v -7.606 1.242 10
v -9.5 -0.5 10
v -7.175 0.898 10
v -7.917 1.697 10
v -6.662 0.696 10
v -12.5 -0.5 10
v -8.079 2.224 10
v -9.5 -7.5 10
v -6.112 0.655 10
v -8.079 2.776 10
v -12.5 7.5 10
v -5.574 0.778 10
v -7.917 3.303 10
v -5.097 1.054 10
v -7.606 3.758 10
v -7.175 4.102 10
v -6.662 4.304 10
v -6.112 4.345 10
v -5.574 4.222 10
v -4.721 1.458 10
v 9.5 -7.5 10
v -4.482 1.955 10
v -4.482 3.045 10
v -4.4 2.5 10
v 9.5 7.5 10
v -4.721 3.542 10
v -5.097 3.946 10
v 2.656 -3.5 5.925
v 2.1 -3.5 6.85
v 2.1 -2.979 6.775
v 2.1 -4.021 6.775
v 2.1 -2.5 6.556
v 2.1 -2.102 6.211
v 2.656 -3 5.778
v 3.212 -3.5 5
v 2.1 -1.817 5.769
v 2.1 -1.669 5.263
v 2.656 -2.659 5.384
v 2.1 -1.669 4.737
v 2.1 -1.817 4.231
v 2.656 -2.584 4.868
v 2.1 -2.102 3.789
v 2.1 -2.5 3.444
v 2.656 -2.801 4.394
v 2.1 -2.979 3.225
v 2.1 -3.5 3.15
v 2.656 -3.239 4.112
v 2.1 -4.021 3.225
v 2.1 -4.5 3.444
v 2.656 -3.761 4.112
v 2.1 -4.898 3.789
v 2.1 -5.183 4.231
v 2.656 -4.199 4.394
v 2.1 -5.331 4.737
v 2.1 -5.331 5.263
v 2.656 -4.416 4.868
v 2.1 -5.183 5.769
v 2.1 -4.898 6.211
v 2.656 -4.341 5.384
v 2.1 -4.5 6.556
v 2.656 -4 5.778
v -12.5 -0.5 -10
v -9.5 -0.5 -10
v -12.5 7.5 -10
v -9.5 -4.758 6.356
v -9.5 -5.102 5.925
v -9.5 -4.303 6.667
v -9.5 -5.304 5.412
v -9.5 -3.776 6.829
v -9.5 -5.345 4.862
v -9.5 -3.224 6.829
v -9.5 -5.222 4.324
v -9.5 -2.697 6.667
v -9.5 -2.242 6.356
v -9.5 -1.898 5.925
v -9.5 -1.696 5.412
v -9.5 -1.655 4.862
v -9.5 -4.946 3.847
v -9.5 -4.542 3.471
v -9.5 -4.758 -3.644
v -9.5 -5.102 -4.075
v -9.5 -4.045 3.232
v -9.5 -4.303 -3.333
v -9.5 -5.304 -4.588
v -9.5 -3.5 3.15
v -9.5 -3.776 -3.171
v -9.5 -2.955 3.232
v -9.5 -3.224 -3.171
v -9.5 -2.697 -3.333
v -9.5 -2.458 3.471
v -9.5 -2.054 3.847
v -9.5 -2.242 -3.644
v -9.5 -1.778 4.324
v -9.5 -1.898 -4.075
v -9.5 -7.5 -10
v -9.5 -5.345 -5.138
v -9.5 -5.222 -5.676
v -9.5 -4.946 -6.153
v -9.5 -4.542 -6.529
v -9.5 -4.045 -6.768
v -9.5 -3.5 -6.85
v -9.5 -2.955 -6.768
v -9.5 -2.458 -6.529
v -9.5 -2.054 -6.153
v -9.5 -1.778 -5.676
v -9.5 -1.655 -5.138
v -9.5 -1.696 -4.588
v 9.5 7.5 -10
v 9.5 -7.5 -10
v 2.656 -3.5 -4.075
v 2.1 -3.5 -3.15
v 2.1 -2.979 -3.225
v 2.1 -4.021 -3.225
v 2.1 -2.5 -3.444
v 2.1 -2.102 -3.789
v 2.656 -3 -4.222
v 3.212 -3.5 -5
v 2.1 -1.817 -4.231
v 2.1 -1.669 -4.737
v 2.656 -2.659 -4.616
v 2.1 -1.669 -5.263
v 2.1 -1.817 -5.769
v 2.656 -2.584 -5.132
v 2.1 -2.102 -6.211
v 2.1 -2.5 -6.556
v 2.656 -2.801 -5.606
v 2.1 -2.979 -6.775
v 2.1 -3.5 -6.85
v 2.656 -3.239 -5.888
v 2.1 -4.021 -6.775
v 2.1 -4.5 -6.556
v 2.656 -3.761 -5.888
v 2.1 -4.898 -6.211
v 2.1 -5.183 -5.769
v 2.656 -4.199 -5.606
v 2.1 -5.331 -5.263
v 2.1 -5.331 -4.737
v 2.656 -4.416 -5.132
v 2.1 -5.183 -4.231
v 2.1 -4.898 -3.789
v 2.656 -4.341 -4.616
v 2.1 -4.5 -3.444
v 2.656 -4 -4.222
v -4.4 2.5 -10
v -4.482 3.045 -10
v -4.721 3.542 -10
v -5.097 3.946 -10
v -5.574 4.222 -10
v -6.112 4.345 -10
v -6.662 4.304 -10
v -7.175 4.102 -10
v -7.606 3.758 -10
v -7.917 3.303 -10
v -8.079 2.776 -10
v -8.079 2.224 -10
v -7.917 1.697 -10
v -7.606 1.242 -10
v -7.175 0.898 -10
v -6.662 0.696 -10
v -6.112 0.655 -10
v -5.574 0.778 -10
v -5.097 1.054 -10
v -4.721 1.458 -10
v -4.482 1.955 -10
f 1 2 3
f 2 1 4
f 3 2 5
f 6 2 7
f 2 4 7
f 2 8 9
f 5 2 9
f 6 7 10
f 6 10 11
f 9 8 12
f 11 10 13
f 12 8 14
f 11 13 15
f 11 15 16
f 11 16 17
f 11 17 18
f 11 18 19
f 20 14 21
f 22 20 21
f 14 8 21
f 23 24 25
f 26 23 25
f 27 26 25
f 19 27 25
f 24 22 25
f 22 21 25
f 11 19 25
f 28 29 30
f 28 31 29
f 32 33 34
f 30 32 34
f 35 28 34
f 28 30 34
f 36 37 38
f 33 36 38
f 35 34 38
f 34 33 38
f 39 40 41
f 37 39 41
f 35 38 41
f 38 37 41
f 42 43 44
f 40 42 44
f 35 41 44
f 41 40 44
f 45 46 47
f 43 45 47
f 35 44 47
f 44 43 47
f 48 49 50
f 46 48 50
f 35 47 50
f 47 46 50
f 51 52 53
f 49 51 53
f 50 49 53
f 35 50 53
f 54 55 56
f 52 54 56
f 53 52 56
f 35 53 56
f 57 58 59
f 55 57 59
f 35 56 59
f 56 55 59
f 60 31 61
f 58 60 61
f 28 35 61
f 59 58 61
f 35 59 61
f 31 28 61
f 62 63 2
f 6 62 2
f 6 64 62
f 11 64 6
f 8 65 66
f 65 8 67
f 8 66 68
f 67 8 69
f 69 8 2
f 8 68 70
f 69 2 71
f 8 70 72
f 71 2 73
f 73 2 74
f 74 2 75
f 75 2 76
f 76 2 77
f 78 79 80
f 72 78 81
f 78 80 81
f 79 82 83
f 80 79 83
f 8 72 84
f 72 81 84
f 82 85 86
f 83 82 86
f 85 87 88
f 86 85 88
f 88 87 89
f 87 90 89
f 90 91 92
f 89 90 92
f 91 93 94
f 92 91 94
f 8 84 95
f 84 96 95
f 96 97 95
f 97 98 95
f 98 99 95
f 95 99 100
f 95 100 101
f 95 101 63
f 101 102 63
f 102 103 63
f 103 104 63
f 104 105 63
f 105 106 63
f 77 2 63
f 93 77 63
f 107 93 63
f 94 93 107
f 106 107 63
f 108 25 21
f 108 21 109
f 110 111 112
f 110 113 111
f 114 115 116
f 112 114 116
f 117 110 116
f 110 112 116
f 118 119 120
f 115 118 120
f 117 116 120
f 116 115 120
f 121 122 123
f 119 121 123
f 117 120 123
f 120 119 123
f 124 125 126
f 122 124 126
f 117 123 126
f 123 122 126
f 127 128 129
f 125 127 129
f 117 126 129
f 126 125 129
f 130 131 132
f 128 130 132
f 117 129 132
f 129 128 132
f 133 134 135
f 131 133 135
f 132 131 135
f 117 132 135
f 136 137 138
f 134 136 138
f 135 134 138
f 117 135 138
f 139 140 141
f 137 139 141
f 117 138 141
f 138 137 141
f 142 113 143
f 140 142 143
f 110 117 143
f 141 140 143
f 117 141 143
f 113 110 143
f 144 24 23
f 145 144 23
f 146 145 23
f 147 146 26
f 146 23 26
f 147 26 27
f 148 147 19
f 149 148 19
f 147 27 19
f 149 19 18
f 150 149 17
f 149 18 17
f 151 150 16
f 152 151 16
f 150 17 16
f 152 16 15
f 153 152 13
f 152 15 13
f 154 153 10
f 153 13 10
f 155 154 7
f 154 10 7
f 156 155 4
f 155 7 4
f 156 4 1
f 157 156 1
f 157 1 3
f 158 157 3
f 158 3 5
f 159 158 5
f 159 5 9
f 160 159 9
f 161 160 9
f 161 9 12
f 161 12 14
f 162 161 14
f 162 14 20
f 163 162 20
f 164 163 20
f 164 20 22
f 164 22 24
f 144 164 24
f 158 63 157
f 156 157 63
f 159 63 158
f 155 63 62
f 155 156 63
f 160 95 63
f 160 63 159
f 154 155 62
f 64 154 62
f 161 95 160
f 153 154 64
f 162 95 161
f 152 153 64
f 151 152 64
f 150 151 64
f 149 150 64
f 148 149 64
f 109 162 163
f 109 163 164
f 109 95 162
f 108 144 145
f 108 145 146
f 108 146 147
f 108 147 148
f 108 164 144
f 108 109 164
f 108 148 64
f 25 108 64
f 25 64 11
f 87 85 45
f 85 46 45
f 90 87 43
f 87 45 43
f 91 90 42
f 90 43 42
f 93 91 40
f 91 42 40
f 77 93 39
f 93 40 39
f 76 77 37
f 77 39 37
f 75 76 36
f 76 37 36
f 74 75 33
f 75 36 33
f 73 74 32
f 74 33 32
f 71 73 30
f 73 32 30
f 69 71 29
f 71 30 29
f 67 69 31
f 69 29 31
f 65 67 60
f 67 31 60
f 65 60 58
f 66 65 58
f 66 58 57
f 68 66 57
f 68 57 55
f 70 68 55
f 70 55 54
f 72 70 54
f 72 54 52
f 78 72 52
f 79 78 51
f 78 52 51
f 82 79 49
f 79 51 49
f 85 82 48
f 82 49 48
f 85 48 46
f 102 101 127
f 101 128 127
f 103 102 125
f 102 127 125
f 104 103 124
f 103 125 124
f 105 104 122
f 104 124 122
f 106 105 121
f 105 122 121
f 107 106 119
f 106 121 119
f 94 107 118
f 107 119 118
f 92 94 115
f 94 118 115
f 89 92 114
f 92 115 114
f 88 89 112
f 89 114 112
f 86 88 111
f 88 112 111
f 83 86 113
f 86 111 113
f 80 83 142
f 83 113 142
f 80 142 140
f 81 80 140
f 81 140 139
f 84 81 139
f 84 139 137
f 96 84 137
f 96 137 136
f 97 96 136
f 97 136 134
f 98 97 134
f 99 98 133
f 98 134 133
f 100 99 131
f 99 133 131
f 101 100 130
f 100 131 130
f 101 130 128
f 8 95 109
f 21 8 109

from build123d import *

# Parameters (mm, degrees)
SKETCH2_W                      = 19
SKETCH2_H                      = 20
BOSS_EXTRUDE1_DEPTH            = 7.5
F_3_7_3_7_DIAMETER_HOLE2_D     = 3.7
F_3_7_3_7_DIAMETER_HOLE2_DEPTH = 11.6
F_3_7_3_7_DIAMETER_HOLE2_TIP   = 1.111592145
SKETCH10_W                     = 20
SKETCH10_H                     = 8
BOSS_EXTRUDE2_DEPTH            = 3
F_3_7_3_7_DIAMETER_HOLE1_D     = 3.7


with BuildPart() as part:
    # Sketch2 → Boss-Extrude1 (new, symmetric)
    with BuildSketch(Plane(origin=(0, 0, 0), x_dir=(1, 0, 0), z_dir=(0, 1, 0))):
        Rectangle(SKETCH2_W, SKETCH2_H)
    extrude(amount=BOSS_EXTRUDE1_DEPTH, both=True)

    # Ø3.7 (3.7) Diameter Hole2
    with Locations(Plane.ZY.offset(9.5)):
        with Locations((-5, -3.5), (5, -3.5)):
            Hole(F_3_7_3_7_DIAMETER_HOLE2_D / 2, depth=F_3_7_3_7_DIAMETER_HOLE2_DEPTH)
            with Locations((0, 0, -(F_3_7_3_7_DIAMETER_HOLE2_DEPTH + F_3_7_3_7_DIAMETER_HOLE2_TIP / 2))):  # 118° drill point
                Cone(0, F_3_7_3_7_DIAMETER_HOLE2_D / 2, F_3_7_3_7_DIAMETER_HOLE2_TIP, mode=Mode.SUBTRACT)

    # Sketch10 → Boss-Extrude2 (add)
    with BuildSketch(Plane.ZY.offset(9.5)):
        with Locations((0, 3.5)):
            Rectangle(SKETCH10_W, SKETCH10_H)
    extrude(amount=BOSS_EXTRUDE2_DEPTH)

    # Ø3.7 (3.7) Diameter Hole1 (through all)
    with Locations(Plane(origin=(0, 0, -10), x_dir=(-1, 0, 0), z_dir=(0, 0, -1))):
        with Locations((6.25, 2.5)):
            Hole(F_3_7_3_7_DIAMETER_HOLE1_D / 2)


solid = part.part
